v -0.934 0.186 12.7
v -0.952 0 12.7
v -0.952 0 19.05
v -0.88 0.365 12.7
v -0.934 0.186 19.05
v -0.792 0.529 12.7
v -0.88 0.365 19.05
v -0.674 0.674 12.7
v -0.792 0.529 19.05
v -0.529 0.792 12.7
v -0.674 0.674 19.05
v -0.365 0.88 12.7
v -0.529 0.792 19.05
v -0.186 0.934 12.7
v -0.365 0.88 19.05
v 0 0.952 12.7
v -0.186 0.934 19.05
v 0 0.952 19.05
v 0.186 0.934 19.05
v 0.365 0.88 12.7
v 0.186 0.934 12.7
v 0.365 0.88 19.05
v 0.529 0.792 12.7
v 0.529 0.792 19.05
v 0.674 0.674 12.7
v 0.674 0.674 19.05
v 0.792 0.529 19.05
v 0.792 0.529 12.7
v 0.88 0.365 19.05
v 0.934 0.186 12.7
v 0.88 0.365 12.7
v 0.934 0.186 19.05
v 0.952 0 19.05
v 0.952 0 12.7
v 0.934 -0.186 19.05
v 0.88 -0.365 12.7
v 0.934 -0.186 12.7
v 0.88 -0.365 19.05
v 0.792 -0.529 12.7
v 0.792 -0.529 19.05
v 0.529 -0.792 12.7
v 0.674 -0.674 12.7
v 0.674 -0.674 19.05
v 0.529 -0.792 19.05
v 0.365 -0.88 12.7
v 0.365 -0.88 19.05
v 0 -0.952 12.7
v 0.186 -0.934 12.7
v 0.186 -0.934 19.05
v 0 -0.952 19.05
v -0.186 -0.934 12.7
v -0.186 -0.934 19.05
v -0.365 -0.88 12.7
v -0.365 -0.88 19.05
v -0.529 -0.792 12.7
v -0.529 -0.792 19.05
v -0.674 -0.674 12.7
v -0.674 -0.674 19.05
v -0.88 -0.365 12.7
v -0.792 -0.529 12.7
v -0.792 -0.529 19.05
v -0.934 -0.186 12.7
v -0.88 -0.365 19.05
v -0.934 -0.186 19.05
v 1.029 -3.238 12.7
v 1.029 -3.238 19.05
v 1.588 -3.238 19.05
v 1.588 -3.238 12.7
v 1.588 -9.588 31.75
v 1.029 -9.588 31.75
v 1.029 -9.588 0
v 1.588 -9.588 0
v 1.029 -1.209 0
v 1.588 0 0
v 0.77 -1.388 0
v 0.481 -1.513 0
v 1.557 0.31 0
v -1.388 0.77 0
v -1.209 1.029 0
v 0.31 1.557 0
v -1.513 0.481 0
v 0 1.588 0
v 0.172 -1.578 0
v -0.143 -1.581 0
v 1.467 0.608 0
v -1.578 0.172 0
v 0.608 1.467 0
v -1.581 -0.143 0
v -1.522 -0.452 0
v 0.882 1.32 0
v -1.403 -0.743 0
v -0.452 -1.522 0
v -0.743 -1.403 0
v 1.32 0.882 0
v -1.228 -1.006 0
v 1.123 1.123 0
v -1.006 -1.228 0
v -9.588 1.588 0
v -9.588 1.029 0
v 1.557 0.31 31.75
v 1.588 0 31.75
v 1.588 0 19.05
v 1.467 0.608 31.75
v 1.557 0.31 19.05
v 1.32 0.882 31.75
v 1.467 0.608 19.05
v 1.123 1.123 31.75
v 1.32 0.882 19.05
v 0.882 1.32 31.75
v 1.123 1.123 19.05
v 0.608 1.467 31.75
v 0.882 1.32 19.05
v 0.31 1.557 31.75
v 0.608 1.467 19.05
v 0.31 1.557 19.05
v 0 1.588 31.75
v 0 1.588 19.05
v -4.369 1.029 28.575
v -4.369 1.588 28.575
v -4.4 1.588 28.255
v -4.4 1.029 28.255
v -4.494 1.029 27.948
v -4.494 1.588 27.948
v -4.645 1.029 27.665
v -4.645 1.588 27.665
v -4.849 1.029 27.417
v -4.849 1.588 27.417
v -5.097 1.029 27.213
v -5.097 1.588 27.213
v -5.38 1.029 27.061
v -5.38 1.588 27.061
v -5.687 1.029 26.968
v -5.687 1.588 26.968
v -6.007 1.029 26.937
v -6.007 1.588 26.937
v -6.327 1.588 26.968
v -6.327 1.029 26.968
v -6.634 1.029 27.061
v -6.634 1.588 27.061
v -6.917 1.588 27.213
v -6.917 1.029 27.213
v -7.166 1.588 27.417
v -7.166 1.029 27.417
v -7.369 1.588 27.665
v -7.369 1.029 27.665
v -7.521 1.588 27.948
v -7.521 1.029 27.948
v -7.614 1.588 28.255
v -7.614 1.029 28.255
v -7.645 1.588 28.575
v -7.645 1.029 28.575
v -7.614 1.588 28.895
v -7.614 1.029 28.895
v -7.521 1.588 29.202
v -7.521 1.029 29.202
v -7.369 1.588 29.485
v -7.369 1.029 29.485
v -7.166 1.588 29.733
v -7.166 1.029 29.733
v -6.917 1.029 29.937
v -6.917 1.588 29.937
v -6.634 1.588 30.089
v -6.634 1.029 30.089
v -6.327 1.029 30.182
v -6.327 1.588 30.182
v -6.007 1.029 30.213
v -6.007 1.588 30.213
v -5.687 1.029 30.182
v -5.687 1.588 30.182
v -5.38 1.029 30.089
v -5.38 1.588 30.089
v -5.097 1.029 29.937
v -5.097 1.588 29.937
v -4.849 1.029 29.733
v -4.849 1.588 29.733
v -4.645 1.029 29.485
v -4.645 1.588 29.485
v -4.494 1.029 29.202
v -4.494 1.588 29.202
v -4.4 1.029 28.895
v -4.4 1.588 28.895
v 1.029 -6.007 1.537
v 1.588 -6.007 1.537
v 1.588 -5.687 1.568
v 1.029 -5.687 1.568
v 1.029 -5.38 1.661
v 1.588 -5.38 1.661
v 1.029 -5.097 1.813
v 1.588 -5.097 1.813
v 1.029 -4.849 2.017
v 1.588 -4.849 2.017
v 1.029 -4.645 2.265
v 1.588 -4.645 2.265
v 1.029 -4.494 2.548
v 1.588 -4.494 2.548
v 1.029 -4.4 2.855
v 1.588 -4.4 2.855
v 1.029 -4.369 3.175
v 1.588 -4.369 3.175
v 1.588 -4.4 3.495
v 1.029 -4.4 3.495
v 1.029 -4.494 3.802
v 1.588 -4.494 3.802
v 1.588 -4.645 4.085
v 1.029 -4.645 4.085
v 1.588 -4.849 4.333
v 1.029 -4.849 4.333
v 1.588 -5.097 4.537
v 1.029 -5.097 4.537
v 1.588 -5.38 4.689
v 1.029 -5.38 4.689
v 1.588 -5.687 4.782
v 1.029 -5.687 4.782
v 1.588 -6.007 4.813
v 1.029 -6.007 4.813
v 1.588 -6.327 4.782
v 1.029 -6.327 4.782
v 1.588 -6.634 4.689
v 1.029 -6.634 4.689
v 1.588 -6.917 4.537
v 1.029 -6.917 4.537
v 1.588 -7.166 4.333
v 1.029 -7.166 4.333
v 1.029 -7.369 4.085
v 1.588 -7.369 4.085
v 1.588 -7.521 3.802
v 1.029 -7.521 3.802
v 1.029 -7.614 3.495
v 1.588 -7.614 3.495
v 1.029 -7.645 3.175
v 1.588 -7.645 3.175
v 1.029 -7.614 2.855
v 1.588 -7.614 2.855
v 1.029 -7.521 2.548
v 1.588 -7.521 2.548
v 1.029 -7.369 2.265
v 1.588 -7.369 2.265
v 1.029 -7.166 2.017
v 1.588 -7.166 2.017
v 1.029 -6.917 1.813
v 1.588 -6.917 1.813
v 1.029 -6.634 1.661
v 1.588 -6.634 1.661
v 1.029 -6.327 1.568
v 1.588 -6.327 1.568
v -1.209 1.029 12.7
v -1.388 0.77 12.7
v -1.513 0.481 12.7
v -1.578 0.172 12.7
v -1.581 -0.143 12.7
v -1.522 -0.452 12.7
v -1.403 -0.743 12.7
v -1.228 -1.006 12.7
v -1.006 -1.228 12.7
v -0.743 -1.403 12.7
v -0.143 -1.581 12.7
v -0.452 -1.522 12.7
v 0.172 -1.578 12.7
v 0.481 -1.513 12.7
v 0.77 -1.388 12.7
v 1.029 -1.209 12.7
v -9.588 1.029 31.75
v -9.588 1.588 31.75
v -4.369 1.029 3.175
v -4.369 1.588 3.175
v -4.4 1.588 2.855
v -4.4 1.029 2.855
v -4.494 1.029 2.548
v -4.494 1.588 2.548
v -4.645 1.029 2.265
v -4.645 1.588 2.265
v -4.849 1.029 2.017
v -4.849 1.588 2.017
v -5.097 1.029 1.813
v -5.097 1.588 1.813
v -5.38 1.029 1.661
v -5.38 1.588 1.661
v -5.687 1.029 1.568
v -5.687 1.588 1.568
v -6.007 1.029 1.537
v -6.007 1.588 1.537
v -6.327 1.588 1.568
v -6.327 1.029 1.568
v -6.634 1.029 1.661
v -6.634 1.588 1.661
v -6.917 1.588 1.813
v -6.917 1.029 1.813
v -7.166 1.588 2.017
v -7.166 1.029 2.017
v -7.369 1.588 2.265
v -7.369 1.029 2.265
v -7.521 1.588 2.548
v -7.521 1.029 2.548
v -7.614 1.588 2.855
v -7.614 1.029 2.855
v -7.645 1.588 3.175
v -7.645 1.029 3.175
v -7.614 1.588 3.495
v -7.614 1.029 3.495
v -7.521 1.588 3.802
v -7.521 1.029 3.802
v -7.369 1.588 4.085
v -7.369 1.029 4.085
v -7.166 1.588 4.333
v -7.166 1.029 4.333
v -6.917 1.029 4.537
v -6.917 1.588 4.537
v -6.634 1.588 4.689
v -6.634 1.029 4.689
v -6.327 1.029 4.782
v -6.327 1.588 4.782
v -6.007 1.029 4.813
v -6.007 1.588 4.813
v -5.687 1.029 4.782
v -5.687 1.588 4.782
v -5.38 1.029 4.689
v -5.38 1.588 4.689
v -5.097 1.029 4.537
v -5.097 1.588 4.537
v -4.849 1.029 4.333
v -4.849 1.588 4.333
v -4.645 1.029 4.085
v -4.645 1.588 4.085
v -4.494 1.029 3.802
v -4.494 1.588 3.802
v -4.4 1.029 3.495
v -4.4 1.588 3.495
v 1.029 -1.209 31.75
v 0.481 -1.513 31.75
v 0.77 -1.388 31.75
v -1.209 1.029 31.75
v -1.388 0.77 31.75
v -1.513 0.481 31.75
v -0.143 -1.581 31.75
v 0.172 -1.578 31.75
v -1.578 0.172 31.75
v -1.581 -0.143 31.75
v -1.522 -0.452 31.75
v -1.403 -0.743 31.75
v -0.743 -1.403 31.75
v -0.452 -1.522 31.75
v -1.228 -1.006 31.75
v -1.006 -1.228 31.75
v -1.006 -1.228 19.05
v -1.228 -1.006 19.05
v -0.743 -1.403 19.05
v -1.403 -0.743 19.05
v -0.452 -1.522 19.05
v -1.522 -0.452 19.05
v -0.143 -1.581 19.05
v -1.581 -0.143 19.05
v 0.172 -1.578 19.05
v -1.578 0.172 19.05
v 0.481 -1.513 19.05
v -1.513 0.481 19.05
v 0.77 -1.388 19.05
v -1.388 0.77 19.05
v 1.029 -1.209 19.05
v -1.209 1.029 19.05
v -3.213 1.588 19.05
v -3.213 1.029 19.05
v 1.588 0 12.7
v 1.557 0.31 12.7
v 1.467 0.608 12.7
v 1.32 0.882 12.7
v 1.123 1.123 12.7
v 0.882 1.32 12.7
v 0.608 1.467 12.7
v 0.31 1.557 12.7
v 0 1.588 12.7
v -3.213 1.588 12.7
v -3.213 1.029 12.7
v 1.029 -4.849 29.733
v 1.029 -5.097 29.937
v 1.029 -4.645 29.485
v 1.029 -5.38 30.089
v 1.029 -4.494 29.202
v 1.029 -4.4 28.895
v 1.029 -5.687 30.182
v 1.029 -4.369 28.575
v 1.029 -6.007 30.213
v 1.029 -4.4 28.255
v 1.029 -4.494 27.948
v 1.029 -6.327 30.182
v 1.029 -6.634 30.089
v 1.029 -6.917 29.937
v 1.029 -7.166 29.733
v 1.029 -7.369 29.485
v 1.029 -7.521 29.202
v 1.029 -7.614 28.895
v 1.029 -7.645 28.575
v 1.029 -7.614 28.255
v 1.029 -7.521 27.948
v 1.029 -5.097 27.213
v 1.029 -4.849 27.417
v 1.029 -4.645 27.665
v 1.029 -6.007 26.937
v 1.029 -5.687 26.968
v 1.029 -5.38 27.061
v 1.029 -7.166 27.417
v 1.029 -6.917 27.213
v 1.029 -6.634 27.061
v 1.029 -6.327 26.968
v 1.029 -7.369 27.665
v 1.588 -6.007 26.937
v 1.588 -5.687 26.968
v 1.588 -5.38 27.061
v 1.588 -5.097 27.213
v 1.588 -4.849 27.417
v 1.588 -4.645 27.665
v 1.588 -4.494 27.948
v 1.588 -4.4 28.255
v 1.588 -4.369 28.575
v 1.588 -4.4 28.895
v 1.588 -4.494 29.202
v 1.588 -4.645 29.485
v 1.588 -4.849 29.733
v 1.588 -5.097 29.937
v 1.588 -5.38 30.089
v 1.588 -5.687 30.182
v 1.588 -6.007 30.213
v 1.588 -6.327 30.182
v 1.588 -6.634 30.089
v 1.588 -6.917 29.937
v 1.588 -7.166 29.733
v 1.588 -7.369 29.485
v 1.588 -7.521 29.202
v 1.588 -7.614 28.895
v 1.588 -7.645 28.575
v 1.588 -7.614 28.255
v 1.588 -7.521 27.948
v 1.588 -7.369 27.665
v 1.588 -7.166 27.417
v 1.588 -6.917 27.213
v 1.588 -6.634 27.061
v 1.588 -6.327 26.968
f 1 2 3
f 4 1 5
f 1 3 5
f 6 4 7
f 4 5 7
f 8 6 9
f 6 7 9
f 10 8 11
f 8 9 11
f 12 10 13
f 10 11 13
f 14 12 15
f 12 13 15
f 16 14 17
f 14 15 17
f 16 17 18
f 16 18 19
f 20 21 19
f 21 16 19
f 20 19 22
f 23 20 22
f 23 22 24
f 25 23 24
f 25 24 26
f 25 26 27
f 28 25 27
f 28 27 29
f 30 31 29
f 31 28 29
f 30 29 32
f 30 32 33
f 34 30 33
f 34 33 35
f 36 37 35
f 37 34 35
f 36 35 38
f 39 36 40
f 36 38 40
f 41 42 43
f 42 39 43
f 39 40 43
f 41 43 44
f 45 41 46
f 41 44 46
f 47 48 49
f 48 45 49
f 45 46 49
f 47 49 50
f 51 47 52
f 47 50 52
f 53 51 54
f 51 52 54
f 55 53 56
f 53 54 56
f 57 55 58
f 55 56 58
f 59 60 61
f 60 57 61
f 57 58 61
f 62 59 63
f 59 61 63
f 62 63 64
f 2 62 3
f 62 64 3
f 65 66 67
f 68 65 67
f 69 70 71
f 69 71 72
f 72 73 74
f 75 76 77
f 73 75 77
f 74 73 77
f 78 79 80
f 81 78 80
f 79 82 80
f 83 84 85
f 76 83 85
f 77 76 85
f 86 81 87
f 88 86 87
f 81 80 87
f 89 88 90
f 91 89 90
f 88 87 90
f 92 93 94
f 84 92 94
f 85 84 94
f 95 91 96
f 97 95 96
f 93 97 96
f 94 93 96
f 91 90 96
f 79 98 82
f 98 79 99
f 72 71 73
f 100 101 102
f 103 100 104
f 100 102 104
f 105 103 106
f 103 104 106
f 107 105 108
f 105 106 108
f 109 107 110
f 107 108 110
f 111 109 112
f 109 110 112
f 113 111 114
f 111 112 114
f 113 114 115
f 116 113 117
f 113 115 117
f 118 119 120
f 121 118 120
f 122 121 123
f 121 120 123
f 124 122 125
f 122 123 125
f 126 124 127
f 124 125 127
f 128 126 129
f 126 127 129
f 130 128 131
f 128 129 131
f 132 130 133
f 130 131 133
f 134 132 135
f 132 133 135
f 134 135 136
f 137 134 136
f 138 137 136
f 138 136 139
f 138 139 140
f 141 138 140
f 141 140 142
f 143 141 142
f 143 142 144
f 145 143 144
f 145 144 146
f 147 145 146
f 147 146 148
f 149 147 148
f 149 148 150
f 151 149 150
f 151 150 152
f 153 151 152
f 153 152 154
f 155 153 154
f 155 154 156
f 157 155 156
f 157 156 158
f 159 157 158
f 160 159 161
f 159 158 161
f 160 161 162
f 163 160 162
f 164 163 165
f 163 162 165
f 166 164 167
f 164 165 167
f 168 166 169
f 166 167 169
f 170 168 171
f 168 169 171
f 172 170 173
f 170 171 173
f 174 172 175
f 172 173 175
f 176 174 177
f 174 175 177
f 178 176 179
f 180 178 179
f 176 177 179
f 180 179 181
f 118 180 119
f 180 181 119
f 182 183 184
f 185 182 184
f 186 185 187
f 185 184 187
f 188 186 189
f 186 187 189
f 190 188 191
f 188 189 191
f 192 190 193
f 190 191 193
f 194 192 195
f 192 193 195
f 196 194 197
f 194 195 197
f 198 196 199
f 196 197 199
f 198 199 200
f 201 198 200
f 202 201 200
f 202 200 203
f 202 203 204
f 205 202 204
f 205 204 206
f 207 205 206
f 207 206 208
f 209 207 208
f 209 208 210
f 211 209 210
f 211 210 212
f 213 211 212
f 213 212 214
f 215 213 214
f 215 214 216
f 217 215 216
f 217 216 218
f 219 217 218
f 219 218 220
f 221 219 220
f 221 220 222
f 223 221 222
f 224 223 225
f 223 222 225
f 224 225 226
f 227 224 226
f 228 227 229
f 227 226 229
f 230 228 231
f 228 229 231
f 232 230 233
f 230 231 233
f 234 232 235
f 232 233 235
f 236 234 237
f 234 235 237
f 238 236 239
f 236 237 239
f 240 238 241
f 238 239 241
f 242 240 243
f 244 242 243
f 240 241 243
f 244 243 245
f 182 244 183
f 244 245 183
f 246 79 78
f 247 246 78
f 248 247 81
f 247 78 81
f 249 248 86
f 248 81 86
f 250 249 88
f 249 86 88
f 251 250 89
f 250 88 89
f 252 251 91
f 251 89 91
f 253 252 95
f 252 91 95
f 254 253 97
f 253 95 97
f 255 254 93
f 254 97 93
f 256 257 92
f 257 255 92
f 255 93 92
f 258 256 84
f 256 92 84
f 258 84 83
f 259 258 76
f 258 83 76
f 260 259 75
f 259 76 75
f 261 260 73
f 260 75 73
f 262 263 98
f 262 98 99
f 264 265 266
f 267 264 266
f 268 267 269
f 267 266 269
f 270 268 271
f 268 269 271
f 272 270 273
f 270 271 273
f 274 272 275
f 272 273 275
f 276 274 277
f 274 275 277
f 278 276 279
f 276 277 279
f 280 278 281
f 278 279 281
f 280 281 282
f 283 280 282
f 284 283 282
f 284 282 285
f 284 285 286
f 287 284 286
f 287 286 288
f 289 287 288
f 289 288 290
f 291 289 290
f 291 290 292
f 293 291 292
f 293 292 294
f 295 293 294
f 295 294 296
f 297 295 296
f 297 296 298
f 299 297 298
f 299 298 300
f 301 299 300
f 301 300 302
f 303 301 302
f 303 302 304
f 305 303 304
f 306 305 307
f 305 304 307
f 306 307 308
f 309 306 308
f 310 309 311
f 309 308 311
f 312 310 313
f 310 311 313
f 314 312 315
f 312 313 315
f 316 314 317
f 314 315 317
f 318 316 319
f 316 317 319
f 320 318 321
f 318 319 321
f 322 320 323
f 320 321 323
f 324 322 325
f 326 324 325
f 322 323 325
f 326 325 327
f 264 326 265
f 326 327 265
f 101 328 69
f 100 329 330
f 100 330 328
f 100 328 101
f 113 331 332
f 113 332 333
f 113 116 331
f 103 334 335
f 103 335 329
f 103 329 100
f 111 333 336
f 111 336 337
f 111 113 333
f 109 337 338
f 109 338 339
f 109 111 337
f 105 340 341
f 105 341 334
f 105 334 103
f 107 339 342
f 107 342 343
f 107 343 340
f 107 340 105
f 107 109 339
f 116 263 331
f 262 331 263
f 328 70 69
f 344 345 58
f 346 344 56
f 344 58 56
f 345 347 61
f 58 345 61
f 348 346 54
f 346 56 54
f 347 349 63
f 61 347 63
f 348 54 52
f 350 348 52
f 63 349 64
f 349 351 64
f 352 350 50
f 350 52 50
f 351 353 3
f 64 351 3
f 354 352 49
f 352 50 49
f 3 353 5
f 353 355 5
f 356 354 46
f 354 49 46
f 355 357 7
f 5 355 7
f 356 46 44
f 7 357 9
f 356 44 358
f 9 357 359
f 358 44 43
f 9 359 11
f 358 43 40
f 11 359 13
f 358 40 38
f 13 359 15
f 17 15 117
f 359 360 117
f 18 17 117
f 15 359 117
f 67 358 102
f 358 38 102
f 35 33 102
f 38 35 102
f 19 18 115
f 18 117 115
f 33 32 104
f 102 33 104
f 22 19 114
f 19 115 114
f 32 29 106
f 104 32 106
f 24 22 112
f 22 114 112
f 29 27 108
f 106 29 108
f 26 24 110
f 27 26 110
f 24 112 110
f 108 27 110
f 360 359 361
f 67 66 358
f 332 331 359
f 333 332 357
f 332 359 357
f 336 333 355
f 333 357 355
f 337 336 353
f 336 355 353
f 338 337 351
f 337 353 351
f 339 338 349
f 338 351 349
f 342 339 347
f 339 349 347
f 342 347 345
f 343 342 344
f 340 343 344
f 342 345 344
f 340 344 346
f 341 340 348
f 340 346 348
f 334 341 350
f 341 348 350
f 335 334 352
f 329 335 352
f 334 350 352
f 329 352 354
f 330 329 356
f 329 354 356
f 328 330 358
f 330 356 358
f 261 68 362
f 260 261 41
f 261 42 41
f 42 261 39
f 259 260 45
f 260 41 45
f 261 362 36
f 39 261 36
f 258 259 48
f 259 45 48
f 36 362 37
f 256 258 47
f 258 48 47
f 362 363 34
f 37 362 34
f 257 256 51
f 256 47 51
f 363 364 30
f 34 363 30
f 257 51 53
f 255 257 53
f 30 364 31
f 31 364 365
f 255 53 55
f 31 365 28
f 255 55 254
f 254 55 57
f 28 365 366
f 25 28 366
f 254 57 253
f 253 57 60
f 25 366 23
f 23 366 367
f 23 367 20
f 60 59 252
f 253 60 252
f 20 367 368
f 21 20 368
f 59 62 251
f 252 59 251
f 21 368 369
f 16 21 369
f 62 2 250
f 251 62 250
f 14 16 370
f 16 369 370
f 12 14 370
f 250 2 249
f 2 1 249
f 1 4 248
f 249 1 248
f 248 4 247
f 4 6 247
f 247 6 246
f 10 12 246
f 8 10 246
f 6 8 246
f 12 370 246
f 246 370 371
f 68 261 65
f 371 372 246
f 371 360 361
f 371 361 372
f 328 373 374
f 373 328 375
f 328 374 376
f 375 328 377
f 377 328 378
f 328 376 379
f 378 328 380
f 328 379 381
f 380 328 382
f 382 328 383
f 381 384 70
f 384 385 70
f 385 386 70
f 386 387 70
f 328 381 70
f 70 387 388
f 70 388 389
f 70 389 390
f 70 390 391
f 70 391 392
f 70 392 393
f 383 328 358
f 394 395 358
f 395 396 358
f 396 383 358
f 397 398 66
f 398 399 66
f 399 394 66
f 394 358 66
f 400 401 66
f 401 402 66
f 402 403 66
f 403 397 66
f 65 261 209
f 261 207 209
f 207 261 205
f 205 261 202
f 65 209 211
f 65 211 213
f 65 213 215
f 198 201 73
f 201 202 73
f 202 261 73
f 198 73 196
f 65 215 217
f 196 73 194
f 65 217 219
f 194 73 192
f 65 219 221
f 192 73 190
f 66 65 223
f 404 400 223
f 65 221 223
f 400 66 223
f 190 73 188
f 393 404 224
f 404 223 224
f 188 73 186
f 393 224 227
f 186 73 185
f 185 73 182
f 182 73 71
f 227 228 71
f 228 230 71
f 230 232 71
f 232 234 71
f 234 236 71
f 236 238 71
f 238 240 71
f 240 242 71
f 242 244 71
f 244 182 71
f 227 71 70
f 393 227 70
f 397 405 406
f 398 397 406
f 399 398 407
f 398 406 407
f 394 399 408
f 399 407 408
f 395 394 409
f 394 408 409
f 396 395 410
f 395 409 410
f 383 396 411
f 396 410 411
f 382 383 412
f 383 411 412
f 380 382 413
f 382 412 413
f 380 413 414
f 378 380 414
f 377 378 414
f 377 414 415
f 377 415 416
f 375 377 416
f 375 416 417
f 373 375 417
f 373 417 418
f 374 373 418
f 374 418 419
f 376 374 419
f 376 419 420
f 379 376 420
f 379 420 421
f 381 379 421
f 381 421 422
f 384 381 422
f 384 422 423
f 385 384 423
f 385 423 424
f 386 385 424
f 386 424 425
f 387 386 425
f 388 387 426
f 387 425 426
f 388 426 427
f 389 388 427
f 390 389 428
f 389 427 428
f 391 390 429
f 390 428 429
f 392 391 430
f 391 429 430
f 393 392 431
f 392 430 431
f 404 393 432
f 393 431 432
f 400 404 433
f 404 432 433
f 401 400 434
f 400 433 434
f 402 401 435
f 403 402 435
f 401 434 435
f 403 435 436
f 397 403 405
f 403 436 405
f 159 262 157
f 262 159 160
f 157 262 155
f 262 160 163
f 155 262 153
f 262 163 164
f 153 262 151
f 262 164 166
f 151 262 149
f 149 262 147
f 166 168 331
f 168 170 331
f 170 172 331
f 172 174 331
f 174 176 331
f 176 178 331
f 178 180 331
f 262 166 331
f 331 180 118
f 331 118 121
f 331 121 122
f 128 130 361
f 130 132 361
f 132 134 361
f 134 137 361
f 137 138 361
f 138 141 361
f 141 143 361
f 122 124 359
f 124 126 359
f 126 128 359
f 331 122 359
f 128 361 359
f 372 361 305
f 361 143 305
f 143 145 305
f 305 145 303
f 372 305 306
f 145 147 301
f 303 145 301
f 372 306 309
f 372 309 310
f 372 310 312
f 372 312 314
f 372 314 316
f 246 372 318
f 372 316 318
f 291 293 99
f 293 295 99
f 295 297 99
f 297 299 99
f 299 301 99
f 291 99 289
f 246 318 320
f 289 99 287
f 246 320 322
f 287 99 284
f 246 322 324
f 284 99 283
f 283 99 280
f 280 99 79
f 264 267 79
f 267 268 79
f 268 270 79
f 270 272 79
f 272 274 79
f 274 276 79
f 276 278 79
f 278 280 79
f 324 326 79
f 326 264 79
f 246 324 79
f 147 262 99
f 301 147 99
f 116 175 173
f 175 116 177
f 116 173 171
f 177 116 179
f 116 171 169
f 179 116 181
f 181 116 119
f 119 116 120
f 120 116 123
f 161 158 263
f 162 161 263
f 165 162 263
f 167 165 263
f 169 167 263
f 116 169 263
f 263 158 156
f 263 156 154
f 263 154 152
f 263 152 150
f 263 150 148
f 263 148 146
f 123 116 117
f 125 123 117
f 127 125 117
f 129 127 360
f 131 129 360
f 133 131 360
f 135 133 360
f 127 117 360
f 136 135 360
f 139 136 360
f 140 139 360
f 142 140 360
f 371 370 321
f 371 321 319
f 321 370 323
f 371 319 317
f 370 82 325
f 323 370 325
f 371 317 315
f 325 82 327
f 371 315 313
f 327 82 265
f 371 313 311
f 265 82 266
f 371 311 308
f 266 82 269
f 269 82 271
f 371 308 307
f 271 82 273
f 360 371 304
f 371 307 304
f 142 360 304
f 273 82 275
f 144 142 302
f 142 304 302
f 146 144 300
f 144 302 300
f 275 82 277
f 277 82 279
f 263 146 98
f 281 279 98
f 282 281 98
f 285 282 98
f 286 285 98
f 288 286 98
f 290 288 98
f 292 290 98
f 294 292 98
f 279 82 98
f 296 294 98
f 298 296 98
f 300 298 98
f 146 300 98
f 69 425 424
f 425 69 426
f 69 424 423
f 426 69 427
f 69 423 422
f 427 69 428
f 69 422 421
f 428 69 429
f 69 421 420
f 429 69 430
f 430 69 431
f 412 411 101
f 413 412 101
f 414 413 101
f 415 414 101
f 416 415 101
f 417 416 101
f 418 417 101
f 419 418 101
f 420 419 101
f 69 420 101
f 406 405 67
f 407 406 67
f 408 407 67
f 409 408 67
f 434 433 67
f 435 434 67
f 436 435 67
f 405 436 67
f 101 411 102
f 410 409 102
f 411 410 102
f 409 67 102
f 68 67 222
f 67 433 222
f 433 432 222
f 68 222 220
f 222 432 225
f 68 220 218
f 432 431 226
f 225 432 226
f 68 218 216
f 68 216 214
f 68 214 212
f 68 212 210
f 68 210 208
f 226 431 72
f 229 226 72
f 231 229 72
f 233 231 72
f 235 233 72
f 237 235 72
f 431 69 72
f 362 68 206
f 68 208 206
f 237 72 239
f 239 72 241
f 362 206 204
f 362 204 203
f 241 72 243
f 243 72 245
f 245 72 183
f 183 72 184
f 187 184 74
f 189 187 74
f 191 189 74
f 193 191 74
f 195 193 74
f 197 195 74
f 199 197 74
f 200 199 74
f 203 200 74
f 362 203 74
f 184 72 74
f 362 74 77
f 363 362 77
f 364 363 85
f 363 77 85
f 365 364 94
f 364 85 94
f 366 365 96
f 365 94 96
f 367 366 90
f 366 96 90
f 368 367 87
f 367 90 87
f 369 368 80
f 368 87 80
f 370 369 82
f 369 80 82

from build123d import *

# Parameters (mm, degrees)
BOSS_EXTRUDE1_DEPTH = 31.75
SKETCH2_R           = 1.6383
SKETCH2_W           = 3.2131
SKETCH2_H           = 6.35
SKETCH2_W_2         = 1.5875
CUT_EXTRUDE1_DEPTH  = 4.826
SKETCH3_R           = 1.6383
CUT_EXTRUDE2_DEPTH  = 12.176
BOSS_EXTRUDE2_REACH = 21.05
SKETCH4_R           = 0.9525


with BuildPart() as part:
    # Sketch1 → Boss-Extrude1 (new body)
    with BuildSketch(Plane.XY):
        with BuildLine():
            Line((0, 1.5875), (-9.5885, 1.5875))
            Line((-9.5885, 1.5875), (-9.5885, 1.0287))
            Line((-9.5885, 1.0287), (-1.209104032, 1.0287))
            ThreePointArc((-1.209104032, 1.0287), (-1.122532015, -1.122532015), (1.0287, -1.209104032))
            Line((1.0287, -1.209104032), (1.0287, -9.5885))
            Line((1.0287, -9.5885), (1.5875, -9.5885))
            Line((1.5875, -9.5885), (1.5875, 0))
            ThreePointArc((1.5875, 0), (1.122532015, 1.122532015), (0, 1.5875))
        make_face()
    extrude(amount=BOSS_EXTRUDE1_DEPTH)

    # Sketch2 → Cut-Extrude1 (cut)
    with BuildSketch(Plane(origin=(0, 1.5875, 0), x_dir=(1, 0, 0), z_dir=(0, 1, 0))):
        with Locations((-6.0071, -28.575)):
            Circle(SKETCH2_R)
        with Locations((-6.0071, -3.175)):
            Circle(SKETCH2_R)
        with Locations((-1.60655, -15.875)):
            Rectangle(SKETCH2_W, SKETCH2_H)
        with Locations((0.79375, -15.875)):
            Rectangle(SKETCH2_W_2, SKETCH2_H)
    extrude(amount=-CUT_EXTRUDE1_DEPTH, mode=Mode.SUBTRACT)

    # Sketch3 → Cut-Extrude2 (cut, through all)
    with BuildSketch(Plane(origin=(1.5875, 0, 0), x_dir=(0, 0, -1), z_dir=(1, 0, 0))):
        with Locations((-28.575, -6.0071)):
            Circle(SKETCH3_R)
        with Locations((-3.175, -6.0071)):
            Circle(SKETCH3_R)
    extrude(amount=-CUT_EXTRUDE2_DEPTH, mode=Mode.SUBTRACT)

    # Sketch4 → Boss-Extrude2 (add, up to next)
    with BuildSketch(Plane(origin=(0, 0, 19.05), x_dir=(-1, 0, 0), z_dir=(0, 0, -1)), mode=Mode.PRIVATE) as boss_extrude2_sk1:
        Circle(SKETCH4_R)
    boss_extrude2_tool1 = extrude(boss_extrude2_sk1.sketch, amount=BOSS_EXTRUDE2_REACH, mode=Mode.PRIVATE) - part.part
    add(boss_extrude2_tool1.solids().sort_by_distance((0, 0, 19.05))[0])


solid = part.part
